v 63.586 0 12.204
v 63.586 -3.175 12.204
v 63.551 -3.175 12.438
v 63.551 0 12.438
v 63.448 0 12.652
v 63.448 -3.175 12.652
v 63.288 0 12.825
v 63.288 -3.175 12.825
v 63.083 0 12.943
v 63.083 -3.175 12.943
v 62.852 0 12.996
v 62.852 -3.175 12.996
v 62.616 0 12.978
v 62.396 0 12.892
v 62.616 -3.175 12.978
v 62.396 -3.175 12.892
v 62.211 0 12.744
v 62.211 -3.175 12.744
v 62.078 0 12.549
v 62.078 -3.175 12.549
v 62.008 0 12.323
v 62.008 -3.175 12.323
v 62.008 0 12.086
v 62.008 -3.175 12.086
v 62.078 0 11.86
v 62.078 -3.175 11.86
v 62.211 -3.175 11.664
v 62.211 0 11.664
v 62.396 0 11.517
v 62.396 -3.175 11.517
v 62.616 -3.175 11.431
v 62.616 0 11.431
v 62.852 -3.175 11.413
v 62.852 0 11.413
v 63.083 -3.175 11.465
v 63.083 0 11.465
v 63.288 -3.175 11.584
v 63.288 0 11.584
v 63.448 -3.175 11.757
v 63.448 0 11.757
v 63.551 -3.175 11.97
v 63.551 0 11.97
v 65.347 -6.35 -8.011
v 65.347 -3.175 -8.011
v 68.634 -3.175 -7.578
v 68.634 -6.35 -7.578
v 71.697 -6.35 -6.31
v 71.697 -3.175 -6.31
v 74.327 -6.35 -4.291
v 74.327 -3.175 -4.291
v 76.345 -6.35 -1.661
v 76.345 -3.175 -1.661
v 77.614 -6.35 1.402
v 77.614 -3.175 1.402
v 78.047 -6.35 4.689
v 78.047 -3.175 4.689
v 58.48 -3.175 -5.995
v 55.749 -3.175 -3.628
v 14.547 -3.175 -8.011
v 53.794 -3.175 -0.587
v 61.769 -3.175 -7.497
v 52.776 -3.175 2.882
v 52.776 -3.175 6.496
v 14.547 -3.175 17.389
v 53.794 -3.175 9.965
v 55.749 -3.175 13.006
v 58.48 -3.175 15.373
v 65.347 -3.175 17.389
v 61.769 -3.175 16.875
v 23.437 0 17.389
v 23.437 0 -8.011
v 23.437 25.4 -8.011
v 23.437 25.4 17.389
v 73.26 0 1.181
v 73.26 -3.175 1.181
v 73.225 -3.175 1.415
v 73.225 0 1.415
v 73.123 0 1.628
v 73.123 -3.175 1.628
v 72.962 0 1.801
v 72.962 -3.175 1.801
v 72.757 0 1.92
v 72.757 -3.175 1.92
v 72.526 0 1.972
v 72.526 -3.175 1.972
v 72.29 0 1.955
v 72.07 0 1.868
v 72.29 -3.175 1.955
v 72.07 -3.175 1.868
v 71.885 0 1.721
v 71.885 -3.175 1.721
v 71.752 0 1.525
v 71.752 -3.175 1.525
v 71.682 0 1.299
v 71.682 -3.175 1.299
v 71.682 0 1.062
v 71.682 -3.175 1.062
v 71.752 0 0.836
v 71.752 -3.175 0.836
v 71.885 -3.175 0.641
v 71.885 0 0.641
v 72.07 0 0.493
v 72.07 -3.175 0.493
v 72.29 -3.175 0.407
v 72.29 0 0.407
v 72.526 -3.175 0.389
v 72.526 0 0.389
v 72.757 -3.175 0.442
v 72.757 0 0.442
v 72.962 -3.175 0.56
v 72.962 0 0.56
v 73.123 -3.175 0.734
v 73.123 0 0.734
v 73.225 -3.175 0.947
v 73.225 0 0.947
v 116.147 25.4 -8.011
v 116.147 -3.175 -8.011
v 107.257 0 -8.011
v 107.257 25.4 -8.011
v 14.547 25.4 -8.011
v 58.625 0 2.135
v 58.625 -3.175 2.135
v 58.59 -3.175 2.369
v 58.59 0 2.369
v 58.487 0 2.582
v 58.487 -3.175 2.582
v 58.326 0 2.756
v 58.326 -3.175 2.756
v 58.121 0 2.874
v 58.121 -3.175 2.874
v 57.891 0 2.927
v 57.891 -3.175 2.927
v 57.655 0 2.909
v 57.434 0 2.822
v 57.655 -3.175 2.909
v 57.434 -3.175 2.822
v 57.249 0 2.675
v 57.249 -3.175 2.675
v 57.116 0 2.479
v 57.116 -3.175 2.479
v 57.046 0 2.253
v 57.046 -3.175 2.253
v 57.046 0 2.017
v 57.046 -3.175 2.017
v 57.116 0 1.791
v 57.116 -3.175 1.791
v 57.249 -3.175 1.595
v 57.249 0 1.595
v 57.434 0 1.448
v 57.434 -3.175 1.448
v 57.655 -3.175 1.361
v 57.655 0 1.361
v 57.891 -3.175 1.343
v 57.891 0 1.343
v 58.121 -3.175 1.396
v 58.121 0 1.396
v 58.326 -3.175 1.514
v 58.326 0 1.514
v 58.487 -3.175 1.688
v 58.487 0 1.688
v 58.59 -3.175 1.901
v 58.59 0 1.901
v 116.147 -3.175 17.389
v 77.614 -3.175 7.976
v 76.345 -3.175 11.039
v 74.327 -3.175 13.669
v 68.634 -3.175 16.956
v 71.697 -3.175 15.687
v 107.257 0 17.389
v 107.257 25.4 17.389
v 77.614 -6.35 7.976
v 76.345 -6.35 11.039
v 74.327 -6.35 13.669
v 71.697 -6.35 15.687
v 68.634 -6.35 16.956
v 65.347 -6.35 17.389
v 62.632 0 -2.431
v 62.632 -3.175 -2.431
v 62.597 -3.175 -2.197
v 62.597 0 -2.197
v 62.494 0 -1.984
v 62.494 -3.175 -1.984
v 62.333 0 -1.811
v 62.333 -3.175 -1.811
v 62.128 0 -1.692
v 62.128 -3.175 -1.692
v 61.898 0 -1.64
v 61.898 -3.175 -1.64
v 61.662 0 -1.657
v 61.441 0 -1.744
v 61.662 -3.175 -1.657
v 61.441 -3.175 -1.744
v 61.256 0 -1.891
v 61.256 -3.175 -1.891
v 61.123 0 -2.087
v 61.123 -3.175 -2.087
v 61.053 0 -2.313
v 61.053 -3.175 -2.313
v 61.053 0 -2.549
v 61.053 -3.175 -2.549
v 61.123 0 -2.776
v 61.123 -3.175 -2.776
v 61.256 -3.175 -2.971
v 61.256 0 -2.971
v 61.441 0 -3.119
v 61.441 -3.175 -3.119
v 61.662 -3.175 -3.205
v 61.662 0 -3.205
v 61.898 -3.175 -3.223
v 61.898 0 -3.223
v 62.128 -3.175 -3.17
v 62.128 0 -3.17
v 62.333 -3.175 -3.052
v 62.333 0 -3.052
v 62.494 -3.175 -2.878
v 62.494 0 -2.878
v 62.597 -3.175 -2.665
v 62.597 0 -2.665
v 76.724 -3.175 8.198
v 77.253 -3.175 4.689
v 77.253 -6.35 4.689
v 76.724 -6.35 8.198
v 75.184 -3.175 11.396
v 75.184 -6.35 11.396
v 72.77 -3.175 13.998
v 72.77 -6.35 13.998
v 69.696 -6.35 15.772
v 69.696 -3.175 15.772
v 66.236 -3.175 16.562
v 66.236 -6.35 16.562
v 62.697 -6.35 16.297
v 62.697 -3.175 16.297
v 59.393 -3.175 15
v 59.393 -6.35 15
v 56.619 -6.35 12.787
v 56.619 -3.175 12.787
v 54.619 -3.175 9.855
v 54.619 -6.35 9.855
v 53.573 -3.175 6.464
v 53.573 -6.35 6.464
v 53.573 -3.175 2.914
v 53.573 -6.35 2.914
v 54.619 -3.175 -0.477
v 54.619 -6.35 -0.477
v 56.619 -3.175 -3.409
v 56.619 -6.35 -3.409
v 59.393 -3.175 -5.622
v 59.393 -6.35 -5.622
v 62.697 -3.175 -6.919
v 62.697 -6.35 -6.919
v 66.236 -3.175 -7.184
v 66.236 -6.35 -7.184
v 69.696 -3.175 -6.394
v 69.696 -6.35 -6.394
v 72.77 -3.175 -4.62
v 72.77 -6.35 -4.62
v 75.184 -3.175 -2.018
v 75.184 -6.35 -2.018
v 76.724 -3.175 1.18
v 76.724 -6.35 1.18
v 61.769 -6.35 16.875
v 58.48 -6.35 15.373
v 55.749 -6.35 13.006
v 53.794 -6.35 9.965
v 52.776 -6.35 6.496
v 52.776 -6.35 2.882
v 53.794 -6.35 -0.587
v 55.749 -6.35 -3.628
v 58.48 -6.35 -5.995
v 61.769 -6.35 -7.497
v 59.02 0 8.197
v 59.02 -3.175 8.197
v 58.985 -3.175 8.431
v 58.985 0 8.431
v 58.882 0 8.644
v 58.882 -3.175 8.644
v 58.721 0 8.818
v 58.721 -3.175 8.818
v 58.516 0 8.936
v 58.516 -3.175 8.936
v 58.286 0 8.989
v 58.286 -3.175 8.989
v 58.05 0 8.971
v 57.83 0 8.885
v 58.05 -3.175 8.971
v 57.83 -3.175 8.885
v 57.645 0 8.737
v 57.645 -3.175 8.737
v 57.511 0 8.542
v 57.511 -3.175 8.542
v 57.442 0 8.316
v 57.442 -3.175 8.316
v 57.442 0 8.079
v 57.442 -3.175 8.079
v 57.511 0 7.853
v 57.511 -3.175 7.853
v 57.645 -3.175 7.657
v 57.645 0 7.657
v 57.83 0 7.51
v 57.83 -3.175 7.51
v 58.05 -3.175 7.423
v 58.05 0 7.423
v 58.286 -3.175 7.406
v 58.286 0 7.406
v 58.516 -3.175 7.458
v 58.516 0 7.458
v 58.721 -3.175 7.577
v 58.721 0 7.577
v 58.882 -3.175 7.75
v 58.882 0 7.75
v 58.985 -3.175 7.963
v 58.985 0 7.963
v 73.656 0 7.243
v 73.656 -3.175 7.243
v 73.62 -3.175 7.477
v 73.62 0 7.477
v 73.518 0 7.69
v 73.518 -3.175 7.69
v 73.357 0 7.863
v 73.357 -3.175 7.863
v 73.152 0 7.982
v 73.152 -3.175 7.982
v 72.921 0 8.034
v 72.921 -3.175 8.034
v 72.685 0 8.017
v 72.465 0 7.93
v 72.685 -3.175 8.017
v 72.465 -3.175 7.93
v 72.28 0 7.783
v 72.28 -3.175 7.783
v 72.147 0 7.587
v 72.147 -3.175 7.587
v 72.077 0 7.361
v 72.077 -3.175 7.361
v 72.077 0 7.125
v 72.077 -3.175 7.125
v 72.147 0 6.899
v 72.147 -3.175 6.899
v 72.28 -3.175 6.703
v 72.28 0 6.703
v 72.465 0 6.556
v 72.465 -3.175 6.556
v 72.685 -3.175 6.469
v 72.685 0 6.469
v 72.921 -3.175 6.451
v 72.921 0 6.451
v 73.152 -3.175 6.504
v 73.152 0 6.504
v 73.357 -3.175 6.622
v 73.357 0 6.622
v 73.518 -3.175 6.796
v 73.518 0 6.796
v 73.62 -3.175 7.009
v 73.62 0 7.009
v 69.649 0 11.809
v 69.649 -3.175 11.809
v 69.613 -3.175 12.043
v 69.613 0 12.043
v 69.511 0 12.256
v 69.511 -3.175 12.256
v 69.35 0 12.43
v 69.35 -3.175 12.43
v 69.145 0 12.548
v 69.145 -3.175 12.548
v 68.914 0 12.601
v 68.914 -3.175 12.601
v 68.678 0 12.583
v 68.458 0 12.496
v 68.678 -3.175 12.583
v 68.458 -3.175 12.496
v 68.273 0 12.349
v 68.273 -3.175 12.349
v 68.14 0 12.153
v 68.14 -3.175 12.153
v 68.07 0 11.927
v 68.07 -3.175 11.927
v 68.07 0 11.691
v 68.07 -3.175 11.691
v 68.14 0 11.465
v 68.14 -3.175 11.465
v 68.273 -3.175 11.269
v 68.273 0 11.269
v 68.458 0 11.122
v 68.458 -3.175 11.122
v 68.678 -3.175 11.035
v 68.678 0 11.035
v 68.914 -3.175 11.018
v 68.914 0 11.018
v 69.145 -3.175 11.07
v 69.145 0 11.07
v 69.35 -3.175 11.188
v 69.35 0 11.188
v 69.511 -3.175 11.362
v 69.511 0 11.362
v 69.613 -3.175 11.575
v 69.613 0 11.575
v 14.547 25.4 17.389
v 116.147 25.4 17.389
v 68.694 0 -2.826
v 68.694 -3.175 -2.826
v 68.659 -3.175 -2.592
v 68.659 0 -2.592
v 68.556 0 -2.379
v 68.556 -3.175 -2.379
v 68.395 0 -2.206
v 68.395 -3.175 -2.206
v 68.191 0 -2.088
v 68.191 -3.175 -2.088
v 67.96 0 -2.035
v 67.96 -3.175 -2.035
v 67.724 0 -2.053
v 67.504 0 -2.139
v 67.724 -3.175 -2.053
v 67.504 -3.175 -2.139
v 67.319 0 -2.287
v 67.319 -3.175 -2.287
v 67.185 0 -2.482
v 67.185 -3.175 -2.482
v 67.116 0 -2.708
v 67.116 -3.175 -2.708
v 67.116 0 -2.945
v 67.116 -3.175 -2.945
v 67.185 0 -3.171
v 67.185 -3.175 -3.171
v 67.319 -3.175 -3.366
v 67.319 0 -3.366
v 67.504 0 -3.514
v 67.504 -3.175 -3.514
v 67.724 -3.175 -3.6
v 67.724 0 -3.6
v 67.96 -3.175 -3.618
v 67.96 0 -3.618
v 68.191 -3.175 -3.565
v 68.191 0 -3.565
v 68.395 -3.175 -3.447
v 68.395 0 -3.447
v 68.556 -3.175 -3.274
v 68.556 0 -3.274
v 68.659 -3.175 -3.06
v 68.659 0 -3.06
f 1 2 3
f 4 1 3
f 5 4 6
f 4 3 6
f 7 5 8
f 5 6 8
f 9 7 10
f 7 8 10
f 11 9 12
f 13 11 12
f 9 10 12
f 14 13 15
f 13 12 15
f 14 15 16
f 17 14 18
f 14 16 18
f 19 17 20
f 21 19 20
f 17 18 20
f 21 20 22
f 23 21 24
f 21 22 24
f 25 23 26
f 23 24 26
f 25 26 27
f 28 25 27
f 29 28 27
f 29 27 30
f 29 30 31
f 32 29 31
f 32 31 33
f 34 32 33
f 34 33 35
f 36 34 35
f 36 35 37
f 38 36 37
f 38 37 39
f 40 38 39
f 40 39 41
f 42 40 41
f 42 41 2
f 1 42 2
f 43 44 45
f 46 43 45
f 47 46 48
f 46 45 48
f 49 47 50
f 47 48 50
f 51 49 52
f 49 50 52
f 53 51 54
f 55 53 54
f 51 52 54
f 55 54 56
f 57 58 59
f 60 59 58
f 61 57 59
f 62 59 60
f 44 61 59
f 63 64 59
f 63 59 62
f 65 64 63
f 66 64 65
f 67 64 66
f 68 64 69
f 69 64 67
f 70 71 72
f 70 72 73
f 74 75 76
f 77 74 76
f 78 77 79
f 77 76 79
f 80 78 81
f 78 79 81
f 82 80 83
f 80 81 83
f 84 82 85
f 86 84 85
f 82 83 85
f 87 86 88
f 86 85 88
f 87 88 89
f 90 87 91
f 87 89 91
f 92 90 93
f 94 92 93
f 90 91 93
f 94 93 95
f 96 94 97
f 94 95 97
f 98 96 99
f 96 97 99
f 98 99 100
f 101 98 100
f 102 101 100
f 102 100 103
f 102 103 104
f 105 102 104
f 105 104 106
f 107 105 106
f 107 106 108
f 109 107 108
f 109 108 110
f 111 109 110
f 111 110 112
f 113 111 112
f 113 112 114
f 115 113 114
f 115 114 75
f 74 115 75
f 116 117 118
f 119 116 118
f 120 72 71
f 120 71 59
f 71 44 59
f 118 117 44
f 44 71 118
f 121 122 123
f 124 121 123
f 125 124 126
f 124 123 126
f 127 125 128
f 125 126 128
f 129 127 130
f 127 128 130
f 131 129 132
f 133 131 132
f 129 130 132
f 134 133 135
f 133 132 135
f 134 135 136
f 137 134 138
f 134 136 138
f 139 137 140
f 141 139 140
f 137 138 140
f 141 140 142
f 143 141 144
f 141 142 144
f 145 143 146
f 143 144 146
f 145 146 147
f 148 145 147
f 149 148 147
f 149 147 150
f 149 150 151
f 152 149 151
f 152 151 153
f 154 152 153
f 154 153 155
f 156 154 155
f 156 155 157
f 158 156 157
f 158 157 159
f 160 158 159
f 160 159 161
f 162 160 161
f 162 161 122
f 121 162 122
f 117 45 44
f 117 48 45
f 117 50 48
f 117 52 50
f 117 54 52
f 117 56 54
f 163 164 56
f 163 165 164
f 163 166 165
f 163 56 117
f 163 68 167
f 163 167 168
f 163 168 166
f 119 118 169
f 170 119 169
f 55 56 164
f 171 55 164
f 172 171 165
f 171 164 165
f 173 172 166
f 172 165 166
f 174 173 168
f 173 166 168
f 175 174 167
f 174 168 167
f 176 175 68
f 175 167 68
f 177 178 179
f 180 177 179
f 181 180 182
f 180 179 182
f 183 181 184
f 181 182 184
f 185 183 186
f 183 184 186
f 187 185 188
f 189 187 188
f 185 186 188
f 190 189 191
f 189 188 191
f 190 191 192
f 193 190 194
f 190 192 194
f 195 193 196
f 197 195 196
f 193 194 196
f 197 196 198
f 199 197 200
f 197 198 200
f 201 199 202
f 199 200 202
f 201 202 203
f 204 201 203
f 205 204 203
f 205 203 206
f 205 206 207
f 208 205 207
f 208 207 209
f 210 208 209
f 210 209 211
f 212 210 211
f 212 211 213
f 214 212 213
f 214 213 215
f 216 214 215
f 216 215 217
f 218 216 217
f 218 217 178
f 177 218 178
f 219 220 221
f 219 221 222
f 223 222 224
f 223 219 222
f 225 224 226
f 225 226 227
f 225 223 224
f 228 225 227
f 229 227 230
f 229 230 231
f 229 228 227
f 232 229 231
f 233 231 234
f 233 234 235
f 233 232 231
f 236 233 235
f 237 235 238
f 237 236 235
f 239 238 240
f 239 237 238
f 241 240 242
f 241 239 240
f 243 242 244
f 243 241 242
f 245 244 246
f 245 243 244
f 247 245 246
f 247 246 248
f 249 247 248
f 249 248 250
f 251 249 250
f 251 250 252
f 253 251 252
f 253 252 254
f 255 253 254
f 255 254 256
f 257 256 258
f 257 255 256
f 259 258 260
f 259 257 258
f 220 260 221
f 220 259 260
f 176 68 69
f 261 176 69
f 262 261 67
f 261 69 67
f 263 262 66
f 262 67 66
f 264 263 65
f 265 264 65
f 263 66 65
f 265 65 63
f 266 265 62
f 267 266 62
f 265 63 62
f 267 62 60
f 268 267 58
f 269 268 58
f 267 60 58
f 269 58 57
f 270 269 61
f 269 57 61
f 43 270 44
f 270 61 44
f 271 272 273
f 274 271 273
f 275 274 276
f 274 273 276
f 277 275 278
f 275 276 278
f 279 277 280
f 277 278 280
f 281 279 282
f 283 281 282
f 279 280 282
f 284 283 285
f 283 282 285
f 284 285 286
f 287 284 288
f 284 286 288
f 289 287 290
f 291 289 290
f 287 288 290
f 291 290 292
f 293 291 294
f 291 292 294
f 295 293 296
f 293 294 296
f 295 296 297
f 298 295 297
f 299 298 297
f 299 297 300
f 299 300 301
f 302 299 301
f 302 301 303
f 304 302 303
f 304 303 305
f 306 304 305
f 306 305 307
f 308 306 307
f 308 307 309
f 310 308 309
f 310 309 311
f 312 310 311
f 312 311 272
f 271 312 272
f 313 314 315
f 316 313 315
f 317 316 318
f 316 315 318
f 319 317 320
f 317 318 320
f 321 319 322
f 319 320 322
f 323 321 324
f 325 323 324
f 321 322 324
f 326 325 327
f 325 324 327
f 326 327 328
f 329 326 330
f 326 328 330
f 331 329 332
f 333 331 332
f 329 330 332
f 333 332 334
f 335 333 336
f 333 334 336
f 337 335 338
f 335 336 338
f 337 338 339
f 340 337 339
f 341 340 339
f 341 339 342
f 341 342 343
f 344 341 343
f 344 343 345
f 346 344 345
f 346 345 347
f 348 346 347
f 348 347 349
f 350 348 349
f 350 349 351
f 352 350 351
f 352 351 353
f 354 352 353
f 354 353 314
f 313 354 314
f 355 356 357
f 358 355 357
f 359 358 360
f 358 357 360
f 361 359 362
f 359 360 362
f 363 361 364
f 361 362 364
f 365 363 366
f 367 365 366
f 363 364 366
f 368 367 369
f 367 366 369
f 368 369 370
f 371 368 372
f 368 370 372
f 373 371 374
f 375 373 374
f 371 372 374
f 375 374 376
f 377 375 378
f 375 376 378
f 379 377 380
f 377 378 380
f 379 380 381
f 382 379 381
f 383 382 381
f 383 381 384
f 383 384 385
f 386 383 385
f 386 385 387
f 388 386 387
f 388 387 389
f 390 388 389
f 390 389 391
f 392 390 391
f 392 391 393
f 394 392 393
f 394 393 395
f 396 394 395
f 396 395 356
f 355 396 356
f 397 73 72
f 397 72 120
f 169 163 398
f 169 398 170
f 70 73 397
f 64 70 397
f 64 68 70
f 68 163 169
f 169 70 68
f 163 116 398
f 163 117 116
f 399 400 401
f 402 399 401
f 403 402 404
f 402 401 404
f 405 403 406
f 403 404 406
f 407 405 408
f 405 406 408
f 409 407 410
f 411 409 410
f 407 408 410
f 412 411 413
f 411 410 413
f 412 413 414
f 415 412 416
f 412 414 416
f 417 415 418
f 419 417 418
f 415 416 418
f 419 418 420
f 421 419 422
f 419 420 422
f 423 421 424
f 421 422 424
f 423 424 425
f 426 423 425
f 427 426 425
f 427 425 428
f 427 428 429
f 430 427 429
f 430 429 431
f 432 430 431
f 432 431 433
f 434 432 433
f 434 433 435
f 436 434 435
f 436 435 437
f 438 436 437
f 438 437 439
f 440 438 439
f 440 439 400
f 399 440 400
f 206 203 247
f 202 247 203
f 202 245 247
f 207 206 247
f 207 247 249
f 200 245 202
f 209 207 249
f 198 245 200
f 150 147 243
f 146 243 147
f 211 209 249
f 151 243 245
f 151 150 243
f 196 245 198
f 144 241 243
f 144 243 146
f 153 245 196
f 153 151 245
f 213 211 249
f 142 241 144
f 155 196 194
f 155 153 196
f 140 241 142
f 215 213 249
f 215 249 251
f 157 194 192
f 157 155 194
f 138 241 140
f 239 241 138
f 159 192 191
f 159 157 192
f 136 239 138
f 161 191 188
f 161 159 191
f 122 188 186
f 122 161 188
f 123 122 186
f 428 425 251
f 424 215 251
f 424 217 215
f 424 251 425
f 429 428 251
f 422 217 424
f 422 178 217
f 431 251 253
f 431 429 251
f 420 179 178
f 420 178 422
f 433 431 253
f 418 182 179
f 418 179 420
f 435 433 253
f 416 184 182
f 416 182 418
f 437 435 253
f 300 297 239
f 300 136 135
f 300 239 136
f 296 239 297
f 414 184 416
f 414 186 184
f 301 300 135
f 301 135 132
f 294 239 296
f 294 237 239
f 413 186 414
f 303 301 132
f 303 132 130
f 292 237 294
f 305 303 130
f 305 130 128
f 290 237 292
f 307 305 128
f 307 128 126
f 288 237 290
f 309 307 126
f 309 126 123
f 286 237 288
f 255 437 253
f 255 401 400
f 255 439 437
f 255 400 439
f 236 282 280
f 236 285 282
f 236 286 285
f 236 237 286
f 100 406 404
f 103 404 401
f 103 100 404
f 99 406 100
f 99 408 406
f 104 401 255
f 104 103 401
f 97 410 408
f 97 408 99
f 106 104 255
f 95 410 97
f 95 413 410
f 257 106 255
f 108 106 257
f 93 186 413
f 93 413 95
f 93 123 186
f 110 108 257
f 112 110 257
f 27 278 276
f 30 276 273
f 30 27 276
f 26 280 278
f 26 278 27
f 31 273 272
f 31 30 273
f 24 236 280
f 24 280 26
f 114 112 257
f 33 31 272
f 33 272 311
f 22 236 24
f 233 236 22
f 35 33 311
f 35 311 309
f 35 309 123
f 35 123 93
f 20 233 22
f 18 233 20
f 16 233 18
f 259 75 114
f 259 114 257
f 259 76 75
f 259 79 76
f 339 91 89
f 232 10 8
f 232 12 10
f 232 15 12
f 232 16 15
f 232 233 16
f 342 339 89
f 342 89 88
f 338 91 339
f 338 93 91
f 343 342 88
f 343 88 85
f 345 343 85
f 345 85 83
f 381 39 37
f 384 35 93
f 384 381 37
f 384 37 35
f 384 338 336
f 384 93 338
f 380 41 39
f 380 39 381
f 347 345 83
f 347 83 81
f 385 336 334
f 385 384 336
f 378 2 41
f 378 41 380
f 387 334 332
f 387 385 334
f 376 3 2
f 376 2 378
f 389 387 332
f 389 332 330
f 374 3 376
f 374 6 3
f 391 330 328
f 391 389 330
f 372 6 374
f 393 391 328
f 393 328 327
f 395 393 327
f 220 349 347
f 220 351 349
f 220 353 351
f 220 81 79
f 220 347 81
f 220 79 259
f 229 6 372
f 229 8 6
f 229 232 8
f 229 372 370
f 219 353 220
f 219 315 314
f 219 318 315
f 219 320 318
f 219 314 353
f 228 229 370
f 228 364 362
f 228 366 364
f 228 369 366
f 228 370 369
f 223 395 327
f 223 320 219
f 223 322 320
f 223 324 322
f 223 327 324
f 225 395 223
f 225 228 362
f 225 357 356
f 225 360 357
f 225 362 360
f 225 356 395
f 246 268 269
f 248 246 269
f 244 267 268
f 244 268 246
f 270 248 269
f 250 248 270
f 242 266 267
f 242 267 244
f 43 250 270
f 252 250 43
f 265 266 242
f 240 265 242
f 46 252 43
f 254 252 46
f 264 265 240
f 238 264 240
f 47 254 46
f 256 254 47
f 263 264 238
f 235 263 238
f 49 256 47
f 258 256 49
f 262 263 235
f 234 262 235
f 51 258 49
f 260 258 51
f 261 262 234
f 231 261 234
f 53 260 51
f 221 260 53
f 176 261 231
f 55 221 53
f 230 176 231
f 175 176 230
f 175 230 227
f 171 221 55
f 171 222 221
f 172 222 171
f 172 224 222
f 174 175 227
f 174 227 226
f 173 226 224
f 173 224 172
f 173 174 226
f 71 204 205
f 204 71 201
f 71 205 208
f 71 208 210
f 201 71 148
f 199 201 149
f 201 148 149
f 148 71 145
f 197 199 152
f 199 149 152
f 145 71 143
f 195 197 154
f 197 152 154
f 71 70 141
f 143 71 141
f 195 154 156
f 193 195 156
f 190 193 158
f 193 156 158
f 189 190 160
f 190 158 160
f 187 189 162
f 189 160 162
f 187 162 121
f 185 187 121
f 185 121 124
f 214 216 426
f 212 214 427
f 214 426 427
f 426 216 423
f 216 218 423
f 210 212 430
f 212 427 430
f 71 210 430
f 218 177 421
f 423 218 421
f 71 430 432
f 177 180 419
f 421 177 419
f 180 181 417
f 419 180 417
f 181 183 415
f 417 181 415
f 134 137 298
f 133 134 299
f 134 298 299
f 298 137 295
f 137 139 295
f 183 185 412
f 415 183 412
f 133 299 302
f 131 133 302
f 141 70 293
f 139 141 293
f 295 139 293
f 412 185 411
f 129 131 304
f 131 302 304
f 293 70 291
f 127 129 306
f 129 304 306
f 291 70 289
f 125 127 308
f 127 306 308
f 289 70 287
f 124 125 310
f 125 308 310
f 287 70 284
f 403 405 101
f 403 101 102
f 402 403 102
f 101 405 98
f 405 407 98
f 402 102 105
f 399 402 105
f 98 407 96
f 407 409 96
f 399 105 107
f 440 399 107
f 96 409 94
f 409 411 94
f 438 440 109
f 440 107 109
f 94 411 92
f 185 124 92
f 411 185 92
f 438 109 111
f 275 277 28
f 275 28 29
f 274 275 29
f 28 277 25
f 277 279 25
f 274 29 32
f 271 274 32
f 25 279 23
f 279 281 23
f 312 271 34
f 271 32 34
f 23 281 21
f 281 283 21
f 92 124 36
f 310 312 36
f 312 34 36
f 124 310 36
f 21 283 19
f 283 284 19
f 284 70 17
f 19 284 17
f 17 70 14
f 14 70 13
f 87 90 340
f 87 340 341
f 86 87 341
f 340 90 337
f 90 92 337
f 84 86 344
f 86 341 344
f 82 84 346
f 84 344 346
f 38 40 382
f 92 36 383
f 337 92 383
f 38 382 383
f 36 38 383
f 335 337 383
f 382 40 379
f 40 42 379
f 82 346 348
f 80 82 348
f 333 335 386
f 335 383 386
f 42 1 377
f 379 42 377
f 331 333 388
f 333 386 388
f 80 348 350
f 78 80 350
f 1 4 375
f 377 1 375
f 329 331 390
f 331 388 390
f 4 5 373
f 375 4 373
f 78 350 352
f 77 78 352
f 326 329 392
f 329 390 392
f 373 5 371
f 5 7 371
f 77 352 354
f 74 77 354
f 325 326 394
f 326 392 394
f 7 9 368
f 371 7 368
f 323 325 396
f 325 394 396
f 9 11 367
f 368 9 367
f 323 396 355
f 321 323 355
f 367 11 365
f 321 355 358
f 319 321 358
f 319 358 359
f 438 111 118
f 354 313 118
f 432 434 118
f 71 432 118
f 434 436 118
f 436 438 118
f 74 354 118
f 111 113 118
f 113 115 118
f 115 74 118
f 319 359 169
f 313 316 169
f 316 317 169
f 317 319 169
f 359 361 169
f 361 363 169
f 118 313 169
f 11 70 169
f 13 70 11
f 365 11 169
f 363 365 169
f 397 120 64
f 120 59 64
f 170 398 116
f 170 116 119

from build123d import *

# Parameters (mm, degrees)
F0_W     = 101.6
F0_H     = 25.4
F1_DEPTH = 3.175
F2_W     = 8.89
F2_H     = 25.4
F3_DEPTH = 25.4
F4_DEPTH = 25.4
F5_R     = 11.90625
F6_DEPTH = 3.175
F7_R     = 0.79375
F8_DEPTH = 25.4


with BuildPart() as f1:
    # F0 (on Front) → F1 (new body)
    with BuildSketch(Plane.XZ):
        with Locations((65.346594, 4.688971)):
            Rectangle(F0_W, F0_H)
    extrude(amount=F1_DEPTH)

    # F2 (on face) → F3 (join)
    with BuildSketch(Plane(origin=(0, 0, 0), x_dir=(-1, 0, 0), z_dir=(0, 1, 0))):
        with Locations((-111.701594, 4.688971)):
            Rectangle(F2_W, F2_H)
    extrude(amount=F3_DEPTH)

    # F2 (on face) → F4 (join)
    with BuildSketch(Plane(origin=(0, 0, 0), x_dir=(-1, 0, 0), z_dir=(0, 1, 0))):
        with Locations((-18.991594, 4.688971)):
            Rectangle(F2_W, F2_H)
    extrude(amount=F4_DEPTH)

    # F5 (on face) → F6 (join)
    with BuildSketch(Plane.XZ.offset(3.175)):
        with BuildLine():
            ThreePointArc((65.346594, -8.011029), (74.32685, -4.291285), (78.046594, 4.688971))
            ThreePointArc((78.046594, 4.688971), (74.32685, 13.669228), (65.346594, 17.388971))
            ThreePointArc((65.346594, 17.388971), (52.646594, 4.688971), (65.346594, -8.011029))
        make_face()
        with Locations((65.346594, 4.688971)):
            Circle(F5_R, mode=Mode.SUBTRACT)
    extrude(amount=F6_DEPTH)

    # F7 (on face) → F8 (cut)
    with BuildSketch(Plane.XZ.offset(3.175)):
        with Locations((58.226489, 8.197249)):
            Circle(F7_R)
        with Locations((62.792646, 12.204373)):
            Circle(F7_R)
        with Locations((68.854871, 11.809077)):
            Circle(F7_R)
        with Locations((72.861995, 7.242919)):
            Circle(F7_R)
        with Locations((72.466699, 1.180694)):
            Circle(F7_R)
        with Locations((67.900542, -2.82643)):
            Circle(F7_R)
        with Locations((61.838316, -2.431134)):
            Circle(F7_R)
        with Locations((57.831193, 2.135024)):
            Circle(F7_R)
    extrude(amount=-F8_DEPTH, mode=Mode.SUBTRACT)


solid = f1.part
